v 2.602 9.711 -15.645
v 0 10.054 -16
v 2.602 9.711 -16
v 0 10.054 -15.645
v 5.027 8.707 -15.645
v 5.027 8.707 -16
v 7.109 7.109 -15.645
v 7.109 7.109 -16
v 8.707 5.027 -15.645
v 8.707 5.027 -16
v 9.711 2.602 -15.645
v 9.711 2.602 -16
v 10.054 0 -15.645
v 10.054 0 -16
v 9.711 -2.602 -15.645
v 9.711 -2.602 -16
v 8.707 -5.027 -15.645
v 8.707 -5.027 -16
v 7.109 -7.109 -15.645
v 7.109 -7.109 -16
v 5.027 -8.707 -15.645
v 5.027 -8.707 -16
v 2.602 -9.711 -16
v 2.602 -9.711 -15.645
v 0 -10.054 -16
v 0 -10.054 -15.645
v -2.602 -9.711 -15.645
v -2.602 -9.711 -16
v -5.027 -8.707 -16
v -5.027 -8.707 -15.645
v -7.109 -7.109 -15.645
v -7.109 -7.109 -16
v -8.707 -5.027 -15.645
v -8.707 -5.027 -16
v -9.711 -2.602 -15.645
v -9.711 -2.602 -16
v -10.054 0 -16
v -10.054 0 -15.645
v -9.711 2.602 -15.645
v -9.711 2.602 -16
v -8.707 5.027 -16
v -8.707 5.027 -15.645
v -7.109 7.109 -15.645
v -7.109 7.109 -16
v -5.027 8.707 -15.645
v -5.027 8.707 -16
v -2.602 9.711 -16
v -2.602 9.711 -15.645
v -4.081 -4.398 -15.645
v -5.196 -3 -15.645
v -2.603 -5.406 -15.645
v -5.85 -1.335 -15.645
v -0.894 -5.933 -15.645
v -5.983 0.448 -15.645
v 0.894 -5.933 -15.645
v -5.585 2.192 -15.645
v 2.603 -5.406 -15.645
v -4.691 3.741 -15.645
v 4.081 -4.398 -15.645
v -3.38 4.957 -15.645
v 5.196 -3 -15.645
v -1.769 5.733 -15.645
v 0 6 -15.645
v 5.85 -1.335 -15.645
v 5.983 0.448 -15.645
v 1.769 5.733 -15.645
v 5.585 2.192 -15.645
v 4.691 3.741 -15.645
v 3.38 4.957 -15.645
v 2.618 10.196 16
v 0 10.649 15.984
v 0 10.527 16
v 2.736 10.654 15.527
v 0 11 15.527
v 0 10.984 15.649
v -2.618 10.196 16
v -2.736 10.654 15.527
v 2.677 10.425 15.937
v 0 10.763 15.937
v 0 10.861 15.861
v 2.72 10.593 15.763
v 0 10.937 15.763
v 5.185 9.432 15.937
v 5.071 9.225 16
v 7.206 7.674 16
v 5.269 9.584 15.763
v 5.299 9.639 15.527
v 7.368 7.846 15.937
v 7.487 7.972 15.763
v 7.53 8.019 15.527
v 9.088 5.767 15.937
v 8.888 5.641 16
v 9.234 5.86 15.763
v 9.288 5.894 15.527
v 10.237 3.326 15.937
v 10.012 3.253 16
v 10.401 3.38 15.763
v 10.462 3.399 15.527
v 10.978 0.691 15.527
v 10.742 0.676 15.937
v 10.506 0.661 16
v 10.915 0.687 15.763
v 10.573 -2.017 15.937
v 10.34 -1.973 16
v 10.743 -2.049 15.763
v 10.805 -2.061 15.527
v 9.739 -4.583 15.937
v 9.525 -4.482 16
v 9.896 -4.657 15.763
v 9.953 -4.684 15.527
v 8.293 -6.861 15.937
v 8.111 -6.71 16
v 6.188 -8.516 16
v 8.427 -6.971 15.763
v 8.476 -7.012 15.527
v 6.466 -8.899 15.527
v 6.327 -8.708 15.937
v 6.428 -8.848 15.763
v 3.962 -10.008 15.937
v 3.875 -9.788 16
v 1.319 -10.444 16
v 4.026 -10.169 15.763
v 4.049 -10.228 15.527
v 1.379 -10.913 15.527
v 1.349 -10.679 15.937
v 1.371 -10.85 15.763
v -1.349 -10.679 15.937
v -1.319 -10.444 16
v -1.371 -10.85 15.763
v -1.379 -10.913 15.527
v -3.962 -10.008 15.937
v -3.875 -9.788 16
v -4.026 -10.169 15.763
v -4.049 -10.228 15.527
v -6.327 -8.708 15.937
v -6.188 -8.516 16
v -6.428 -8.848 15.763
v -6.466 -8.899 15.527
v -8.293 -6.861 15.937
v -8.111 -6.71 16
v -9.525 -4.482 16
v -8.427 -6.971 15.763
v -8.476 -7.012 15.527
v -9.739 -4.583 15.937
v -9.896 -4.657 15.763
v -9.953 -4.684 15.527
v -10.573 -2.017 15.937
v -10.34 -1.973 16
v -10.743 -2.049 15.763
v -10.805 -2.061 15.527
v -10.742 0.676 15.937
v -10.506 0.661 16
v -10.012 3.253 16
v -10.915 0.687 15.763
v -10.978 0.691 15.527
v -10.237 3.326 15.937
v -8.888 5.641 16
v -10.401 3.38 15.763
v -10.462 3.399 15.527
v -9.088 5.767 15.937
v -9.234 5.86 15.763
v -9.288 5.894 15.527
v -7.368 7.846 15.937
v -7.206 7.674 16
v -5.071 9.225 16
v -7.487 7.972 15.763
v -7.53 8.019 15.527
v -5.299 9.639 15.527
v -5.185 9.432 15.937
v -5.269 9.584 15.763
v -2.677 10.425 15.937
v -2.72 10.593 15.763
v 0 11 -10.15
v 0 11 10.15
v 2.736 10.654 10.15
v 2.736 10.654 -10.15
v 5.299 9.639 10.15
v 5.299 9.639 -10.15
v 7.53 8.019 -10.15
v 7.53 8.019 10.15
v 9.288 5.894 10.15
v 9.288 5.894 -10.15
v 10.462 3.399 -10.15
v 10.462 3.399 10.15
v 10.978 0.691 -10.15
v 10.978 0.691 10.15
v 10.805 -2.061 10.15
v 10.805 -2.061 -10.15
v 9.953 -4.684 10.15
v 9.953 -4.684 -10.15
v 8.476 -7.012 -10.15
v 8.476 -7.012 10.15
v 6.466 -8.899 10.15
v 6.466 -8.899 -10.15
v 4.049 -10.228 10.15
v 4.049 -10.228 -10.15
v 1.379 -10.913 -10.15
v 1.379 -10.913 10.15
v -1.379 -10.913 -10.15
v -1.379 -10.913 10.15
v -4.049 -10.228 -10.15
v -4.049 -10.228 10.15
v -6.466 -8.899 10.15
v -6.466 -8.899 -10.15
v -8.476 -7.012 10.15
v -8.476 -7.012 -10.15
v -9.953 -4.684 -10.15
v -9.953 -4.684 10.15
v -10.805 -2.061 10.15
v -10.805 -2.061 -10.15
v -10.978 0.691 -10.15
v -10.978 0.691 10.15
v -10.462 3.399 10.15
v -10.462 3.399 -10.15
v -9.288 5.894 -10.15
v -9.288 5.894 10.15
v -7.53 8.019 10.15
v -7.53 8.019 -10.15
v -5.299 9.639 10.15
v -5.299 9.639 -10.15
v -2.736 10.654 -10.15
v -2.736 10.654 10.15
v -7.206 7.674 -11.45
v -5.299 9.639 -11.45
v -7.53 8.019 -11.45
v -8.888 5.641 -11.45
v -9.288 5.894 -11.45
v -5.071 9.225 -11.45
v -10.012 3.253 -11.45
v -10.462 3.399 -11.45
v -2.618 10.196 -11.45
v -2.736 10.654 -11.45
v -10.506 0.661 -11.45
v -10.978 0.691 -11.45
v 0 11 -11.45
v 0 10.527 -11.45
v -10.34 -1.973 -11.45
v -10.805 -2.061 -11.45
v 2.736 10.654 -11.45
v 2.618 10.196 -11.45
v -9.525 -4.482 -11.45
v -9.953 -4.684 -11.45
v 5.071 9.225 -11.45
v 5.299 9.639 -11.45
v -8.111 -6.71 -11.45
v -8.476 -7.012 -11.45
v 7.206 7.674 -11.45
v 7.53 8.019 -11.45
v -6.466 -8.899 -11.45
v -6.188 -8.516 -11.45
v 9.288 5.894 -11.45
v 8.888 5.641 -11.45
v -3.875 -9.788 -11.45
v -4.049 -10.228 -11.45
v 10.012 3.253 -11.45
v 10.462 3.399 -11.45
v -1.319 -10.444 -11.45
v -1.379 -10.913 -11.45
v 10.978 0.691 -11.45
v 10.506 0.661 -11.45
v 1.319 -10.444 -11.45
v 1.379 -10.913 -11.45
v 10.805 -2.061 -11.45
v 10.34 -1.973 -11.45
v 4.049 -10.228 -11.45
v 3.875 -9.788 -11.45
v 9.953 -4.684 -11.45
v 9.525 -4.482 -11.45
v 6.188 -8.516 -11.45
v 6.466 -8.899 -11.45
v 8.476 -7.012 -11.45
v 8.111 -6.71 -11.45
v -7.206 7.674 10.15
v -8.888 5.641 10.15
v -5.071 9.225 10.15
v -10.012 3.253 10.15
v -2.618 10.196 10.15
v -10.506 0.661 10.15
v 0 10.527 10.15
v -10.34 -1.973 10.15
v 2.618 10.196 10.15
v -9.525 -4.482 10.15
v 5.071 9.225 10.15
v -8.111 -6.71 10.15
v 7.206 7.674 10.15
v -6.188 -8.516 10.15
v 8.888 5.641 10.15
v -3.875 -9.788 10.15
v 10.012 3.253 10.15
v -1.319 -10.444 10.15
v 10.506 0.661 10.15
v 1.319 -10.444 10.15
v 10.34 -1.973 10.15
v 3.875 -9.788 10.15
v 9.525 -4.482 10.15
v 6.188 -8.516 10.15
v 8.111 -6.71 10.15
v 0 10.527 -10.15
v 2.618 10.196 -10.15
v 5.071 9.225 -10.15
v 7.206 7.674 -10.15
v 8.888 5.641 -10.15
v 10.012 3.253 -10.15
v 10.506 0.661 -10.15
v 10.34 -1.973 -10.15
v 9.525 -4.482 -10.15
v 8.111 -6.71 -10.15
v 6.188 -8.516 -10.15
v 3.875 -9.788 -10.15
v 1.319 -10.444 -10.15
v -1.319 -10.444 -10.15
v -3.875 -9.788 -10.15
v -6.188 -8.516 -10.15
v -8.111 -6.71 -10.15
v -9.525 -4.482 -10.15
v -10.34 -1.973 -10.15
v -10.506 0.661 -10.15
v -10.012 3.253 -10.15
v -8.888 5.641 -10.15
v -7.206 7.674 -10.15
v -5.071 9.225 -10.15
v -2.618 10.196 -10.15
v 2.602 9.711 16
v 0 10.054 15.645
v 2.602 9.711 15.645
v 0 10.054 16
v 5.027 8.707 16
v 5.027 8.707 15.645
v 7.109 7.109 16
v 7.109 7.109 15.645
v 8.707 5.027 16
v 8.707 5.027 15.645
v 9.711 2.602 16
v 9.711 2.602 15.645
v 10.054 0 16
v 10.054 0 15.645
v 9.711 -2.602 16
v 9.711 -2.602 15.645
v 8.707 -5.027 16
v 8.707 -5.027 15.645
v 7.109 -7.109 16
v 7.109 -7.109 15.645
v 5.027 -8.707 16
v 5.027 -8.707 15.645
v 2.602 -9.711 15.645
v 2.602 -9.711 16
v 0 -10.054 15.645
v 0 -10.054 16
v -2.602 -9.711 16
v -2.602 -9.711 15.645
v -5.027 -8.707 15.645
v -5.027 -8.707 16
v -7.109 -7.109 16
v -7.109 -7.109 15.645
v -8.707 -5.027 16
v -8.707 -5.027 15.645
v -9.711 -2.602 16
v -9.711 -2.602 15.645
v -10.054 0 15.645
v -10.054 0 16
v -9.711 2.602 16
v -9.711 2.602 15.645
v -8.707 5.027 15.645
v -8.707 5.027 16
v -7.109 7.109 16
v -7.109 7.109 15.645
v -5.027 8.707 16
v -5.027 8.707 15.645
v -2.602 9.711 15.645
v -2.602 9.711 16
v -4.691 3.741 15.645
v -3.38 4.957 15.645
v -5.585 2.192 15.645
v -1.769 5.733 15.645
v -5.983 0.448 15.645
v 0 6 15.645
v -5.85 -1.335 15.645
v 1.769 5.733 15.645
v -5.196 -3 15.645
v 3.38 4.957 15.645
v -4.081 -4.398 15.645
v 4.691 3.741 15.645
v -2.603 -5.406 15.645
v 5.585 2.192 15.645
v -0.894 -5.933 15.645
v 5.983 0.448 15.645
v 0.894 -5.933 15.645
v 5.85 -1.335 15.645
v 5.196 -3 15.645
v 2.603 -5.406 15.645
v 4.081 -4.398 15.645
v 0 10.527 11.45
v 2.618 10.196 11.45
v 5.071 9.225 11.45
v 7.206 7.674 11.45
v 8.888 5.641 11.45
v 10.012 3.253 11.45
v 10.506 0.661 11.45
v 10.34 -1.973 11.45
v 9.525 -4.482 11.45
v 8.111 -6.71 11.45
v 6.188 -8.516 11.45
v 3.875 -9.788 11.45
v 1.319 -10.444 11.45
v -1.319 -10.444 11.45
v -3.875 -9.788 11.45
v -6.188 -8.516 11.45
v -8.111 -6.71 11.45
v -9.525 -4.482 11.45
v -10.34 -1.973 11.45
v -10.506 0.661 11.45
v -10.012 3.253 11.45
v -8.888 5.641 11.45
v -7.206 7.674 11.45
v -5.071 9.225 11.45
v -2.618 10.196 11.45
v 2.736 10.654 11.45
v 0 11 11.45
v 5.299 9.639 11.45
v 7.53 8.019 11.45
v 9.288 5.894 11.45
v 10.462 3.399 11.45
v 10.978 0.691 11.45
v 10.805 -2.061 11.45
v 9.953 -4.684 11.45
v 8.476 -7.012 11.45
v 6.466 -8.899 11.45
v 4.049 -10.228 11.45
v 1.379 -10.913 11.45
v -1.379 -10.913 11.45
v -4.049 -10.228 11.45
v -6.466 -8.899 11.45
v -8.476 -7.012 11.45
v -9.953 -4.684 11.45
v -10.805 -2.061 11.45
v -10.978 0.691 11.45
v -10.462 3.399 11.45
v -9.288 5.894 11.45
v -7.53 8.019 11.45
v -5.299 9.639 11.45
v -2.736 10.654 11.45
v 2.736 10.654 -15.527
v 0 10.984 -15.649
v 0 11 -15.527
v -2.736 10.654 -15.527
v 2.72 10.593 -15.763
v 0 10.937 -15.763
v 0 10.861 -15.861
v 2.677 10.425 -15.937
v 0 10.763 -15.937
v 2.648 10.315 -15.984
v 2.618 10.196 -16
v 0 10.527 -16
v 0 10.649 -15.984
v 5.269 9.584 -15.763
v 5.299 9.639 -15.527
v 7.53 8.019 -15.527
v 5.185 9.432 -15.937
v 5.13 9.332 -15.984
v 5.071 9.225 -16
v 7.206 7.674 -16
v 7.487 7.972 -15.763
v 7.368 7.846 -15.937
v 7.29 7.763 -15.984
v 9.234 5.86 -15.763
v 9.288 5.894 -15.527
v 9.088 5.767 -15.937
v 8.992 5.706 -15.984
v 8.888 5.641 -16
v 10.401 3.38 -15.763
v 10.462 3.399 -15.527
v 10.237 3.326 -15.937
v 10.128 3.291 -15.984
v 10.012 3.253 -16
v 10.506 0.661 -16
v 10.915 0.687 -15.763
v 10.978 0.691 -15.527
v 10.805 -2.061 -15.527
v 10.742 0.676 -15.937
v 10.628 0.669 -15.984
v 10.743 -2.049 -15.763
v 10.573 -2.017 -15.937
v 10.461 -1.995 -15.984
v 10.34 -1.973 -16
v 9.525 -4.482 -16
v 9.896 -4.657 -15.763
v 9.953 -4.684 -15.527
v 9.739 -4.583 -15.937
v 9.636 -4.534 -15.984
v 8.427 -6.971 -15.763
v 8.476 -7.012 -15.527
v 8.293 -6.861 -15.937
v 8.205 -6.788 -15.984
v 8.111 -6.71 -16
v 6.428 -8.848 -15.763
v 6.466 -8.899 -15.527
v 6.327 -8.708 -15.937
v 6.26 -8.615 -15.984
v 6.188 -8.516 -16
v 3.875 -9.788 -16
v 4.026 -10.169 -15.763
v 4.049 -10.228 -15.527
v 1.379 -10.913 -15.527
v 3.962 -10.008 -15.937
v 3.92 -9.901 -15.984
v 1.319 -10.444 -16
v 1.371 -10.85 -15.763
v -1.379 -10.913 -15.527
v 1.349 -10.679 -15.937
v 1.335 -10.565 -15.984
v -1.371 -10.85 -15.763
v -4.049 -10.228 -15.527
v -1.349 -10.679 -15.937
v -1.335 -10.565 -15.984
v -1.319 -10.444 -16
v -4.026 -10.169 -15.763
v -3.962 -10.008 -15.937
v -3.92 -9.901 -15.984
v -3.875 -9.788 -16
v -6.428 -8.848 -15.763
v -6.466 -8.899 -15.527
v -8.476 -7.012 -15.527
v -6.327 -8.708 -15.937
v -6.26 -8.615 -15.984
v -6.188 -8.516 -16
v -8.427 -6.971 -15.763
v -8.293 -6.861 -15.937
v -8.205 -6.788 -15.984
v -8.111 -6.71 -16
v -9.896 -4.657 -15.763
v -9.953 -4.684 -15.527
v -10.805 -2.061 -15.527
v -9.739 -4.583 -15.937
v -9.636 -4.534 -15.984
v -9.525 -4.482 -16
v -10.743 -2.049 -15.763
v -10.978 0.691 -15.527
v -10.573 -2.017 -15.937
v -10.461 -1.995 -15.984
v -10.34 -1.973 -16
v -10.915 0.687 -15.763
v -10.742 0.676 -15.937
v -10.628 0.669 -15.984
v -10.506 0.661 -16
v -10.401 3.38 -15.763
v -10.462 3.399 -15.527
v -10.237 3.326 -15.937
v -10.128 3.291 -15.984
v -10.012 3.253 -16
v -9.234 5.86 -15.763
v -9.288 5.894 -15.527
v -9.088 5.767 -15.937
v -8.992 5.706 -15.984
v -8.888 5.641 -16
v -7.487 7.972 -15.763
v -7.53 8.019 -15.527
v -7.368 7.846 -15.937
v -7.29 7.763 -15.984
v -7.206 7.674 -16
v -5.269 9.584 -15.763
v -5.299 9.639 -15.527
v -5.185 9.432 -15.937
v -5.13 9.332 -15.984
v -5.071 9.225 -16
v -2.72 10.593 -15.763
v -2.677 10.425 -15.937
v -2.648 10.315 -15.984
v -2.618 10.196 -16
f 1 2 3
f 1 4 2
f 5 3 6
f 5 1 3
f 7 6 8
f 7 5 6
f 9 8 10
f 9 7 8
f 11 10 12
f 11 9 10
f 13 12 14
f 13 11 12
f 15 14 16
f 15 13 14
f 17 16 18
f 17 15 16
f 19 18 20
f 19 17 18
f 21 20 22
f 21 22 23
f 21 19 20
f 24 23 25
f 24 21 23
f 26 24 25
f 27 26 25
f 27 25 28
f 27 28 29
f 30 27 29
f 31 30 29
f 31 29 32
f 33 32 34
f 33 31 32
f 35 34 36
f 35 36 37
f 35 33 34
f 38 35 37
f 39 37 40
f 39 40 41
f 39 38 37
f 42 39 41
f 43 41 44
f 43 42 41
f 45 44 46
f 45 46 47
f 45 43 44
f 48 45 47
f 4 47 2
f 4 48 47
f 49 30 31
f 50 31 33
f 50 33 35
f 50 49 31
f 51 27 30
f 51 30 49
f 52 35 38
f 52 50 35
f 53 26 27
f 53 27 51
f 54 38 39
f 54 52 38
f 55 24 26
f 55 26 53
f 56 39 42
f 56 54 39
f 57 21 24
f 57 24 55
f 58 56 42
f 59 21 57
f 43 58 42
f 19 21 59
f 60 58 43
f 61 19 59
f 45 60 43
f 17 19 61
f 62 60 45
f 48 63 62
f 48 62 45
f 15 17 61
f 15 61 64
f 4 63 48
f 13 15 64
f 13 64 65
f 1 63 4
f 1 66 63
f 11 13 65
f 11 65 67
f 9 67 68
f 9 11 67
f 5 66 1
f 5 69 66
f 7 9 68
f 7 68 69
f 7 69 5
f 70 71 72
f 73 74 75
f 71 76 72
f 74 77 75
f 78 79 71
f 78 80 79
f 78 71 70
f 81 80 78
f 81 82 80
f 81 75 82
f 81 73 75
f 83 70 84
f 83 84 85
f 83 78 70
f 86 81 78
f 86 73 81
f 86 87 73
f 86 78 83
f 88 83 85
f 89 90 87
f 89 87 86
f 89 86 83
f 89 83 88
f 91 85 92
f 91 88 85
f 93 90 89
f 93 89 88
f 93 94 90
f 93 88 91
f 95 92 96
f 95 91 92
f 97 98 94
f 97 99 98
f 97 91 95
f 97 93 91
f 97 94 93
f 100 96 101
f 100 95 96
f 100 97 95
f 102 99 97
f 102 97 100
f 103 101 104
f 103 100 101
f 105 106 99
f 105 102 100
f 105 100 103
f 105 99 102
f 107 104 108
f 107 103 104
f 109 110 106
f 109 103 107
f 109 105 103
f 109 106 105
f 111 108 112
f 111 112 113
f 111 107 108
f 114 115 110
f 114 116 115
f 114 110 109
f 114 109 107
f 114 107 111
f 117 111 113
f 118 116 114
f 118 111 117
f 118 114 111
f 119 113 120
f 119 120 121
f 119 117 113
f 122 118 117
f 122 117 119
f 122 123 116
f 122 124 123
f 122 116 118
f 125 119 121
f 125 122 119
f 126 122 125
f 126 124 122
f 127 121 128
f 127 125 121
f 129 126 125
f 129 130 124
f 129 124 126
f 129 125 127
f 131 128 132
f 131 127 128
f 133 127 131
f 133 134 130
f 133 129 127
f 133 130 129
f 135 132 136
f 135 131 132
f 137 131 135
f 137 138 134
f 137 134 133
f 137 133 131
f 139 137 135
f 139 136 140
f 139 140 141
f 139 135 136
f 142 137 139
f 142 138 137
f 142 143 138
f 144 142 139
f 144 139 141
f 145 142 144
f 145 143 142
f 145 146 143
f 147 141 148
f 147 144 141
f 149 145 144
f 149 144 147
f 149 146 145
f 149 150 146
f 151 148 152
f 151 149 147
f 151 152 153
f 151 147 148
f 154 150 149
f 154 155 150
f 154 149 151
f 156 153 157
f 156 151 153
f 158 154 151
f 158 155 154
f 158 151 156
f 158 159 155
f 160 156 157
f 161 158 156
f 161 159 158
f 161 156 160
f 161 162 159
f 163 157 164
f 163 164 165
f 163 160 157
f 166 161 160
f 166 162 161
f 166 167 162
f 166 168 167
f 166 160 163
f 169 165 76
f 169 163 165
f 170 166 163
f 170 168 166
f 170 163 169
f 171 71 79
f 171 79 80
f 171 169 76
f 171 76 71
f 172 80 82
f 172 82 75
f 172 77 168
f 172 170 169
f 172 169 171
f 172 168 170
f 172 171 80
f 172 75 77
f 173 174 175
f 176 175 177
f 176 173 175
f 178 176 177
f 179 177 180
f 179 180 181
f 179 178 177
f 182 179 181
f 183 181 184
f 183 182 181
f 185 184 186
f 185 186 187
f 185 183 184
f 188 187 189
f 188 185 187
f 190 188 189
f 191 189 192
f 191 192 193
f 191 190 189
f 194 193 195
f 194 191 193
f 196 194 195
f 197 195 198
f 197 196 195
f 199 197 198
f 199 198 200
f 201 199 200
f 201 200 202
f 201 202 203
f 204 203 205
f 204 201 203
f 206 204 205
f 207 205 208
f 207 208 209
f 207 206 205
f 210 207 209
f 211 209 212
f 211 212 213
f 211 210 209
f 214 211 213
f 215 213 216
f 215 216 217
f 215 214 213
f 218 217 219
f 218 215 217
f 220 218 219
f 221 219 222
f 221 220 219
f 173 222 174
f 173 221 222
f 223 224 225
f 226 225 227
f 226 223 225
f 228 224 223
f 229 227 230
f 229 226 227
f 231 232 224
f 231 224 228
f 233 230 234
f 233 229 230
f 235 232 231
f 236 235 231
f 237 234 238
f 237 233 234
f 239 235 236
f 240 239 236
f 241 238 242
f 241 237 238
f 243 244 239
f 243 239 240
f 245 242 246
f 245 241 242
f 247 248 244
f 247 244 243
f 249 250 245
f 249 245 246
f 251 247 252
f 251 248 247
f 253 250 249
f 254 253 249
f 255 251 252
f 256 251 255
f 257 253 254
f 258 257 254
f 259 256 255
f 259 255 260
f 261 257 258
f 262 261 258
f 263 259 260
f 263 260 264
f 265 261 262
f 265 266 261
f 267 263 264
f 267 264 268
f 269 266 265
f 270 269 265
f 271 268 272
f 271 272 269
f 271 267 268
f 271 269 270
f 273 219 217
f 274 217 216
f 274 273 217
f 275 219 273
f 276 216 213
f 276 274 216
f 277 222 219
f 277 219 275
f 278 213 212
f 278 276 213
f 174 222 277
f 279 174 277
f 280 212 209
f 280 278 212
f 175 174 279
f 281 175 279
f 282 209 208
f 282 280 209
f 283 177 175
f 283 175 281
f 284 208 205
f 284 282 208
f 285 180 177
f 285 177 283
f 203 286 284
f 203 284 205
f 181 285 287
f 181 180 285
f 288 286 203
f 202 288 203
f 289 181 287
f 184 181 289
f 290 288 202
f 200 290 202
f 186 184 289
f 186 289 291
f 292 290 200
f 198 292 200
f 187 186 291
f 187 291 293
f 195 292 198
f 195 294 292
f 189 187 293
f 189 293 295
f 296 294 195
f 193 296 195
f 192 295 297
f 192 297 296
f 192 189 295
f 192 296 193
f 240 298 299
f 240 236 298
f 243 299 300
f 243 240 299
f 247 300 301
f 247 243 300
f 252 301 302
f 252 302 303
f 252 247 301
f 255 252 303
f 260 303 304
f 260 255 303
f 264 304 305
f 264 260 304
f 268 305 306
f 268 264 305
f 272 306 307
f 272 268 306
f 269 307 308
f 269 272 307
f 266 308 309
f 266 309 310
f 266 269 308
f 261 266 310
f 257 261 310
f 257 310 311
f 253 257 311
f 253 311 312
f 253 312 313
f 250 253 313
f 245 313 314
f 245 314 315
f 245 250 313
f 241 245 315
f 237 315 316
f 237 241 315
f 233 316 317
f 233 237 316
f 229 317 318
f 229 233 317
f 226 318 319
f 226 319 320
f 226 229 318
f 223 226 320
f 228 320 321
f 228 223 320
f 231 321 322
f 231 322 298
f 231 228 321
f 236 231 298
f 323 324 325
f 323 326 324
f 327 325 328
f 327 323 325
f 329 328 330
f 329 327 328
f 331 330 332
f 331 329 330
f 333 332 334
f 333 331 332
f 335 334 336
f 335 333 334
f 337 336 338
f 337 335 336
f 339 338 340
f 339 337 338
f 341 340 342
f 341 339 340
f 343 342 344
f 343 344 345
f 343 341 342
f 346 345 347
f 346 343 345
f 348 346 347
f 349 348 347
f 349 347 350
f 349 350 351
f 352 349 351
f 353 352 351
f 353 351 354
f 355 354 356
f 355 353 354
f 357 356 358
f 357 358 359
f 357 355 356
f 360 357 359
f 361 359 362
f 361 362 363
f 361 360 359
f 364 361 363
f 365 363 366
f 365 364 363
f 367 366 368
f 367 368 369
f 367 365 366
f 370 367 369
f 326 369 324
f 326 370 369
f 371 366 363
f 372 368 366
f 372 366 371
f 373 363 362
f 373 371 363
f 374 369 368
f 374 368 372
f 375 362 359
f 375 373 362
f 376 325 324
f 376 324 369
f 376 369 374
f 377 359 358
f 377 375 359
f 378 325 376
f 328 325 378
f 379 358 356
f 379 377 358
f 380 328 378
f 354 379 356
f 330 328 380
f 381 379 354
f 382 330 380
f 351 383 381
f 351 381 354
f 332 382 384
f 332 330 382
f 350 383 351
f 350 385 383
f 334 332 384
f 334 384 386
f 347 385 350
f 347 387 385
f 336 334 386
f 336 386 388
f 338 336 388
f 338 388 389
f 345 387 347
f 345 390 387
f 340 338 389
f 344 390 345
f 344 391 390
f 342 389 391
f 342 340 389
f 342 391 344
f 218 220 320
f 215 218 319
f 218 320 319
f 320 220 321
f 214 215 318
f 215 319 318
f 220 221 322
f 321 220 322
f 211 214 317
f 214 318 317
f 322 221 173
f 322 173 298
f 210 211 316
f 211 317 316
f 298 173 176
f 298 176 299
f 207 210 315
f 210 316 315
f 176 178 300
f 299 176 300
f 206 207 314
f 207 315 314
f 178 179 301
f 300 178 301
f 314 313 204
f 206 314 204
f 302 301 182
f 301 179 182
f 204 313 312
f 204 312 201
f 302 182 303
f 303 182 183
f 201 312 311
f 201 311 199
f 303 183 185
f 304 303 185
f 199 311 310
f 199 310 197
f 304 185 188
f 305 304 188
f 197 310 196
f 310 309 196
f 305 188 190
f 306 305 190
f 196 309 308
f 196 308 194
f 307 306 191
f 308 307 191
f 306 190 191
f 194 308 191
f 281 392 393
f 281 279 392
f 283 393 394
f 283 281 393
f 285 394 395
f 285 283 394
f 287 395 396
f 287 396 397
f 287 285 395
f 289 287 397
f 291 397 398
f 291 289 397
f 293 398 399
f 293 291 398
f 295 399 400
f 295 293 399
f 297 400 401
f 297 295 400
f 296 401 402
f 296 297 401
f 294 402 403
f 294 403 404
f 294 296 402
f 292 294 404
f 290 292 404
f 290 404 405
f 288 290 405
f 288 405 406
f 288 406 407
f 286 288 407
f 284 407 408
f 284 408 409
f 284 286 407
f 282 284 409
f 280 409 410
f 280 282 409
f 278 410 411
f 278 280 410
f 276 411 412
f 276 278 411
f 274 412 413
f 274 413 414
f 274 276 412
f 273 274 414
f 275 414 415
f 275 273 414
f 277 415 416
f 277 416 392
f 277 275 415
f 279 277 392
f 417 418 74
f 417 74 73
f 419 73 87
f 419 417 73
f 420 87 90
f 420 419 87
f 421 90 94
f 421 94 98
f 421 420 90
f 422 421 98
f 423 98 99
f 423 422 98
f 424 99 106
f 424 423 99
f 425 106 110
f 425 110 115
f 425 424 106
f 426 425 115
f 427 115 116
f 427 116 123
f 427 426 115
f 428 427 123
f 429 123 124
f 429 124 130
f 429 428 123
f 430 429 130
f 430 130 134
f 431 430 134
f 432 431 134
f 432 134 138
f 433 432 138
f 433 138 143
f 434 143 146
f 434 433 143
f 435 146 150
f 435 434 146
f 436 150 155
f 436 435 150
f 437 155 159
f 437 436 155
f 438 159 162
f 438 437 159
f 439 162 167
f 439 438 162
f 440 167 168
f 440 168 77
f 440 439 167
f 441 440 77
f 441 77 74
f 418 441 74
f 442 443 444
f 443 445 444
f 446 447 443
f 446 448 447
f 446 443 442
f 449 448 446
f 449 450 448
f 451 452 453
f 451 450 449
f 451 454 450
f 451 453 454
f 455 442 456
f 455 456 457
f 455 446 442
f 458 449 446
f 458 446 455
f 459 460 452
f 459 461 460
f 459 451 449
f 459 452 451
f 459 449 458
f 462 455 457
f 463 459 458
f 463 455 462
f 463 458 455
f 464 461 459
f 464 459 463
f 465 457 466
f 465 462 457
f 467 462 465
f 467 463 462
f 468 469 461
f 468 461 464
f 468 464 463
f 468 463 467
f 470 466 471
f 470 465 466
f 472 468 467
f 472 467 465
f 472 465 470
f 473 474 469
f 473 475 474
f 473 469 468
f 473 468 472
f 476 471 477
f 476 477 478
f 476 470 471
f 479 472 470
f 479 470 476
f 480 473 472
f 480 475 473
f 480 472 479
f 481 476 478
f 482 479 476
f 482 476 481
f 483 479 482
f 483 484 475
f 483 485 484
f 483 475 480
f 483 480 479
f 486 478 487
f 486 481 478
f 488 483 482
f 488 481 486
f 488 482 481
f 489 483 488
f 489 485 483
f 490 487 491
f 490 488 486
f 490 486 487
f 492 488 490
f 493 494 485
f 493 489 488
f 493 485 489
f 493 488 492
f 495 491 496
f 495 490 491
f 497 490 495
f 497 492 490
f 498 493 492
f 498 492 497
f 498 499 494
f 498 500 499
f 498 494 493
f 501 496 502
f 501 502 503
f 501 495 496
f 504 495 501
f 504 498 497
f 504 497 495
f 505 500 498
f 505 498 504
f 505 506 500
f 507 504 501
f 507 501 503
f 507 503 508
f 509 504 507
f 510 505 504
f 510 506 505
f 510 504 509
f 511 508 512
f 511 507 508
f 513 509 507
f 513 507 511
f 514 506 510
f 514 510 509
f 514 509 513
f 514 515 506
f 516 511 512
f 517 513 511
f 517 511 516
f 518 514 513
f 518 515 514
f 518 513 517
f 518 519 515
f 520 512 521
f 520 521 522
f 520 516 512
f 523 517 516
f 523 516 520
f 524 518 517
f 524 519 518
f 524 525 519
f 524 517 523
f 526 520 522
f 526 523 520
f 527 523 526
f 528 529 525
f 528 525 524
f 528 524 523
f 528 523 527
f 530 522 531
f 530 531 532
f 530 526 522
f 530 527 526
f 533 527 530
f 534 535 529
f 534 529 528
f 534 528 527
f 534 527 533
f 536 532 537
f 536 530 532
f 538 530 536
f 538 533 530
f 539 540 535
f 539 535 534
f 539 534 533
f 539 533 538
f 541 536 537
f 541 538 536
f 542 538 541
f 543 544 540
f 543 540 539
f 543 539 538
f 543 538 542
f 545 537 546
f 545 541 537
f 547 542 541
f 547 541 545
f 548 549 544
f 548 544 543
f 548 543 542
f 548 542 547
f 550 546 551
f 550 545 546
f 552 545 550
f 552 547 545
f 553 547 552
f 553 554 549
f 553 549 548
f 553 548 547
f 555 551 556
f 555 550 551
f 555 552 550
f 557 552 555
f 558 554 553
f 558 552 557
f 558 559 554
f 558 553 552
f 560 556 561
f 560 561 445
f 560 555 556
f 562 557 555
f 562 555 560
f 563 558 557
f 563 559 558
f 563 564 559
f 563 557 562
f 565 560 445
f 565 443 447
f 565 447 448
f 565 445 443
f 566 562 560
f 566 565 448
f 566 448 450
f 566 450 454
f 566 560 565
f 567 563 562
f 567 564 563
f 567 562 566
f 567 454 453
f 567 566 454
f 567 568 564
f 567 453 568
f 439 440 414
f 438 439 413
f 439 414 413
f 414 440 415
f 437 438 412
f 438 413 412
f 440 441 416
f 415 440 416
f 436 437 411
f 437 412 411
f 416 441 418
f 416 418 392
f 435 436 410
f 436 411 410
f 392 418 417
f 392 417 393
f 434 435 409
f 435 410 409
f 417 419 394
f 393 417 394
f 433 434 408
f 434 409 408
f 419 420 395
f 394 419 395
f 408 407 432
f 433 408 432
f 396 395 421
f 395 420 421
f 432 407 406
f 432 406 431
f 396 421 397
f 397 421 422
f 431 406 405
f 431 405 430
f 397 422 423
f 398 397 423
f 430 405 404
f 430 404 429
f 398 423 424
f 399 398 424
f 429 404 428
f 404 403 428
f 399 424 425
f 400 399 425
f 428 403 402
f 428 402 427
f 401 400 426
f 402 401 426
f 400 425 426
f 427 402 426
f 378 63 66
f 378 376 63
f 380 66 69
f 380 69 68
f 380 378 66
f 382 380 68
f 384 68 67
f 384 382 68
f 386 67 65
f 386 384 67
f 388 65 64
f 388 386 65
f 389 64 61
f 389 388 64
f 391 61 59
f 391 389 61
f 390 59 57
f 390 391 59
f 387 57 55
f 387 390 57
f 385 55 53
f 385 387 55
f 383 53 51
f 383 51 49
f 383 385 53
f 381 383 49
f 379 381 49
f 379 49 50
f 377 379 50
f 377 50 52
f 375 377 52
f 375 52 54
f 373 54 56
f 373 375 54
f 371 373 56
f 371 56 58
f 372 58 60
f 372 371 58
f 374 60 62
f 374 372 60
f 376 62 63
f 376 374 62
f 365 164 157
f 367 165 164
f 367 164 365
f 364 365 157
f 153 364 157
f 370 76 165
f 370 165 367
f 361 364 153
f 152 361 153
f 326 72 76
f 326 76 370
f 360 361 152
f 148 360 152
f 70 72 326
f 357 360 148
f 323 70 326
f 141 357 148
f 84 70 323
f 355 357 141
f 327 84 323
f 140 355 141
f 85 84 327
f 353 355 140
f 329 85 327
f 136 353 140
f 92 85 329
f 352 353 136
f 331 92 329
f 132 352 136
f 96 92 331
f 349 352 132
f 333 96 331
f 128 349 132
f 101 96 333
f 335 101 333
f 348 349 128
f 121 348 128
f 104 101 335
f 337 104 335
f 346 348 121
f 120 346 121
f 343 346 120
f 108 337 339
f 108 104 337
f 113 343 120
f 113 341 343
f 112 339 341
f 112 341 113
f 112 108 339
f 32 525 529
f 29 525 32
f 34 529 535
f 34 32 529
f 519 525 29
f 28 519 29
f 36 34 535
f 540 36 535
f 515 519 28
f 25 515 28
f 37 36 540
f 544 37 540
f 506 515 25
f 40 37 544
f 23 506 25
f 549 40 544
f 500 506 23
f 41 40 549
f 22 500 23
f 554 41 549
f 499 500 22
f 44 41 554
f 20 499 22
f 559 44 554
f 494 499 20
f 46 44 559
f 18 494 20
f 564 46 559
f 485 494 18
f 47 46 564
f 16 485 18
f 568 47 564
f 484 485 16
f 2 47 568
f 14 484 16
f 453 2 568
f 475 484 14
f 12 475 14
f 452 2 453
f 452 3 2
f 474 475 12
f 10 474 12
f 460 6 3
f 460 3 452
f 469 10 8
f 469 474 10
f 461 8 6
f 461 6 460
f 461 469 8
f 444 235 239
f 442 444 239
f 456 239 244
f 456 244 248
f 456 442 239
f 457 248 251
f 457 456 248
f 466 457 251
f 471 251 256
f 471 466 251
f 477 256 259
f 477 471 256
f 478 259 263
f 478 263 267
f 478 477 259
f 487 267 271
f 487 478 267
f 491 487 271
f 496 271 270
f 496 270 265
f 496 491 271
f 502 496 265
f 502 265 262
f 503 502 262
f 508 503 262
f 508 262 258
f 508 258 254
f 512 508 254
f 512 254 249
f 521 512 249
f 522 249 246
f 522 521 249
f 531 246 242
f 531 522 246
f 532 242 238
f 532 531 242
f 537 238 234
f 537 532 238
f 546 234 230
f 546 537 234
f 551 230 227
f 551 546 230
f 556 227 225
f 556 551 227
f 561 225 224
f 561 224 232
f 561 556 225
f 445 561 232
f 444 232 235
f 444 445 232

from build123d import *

# Parameters (mm, degrees)
SKETCH3_W = 1.3
SKETCH3_H = 0.473161305


with BuildPart() as part:
    # Sketch2 → Body (revolve)
    with BuildSketch(Plane(origin=(0, 0, 0), x_dir=(0, 0, -1), z_dir=(1, 0, 0))):
        with BuildLine():
            Line((-15.645349183, 10.053677391), (-16, 10.053677391))
            Line((-16, 10.053677391), (-16, 10.526838695))
            ThreePointArc((-16, 10.526838695), (-15.861414262, 10.861414262), (-15.526838695, 11))
            Line((-15.526838695, 11), (15.526838695, 11))
            ThreePointArc((15.526838695, 11), (15.861414262, 10.861414262), (16, 10.526838695))
            Line((16, 10.526838695), (16, 10.053677391))
            Line((16, 10.053677391), (15.645349183, 10.053677391))
            Line((15.645349183, 10.053677391), (15.645349183, 6))
            Line((15.645349183, 6), (-15.645349183, 6))
            Line((-15.645349183, 6), (-15.645349183, 10.053677391))
        make_face()
    revolve(axis=Axis((0, 0, 16), (0, 0, -1)))

    # Sketch3 → Track (revolve, cut)
    with BuildSketch(Plane(origin=(0, 0, 0), x_dir=(0, 0, -1), z_dir=(1, 0, 0))):
        with Locations((10.8, 10.763419348)):
            Rectangle(SKETCH3_W, SKETCH3_H)
        with Locations((-10.8, 10.763419348)):
            Rectangle(SKETCH3_W, SKETCH3_H)
    revolve(axis=Axis((0, 0, 16), (0, 0, -1)), mode=Mode.SUBTRACT)


solid = part.part
